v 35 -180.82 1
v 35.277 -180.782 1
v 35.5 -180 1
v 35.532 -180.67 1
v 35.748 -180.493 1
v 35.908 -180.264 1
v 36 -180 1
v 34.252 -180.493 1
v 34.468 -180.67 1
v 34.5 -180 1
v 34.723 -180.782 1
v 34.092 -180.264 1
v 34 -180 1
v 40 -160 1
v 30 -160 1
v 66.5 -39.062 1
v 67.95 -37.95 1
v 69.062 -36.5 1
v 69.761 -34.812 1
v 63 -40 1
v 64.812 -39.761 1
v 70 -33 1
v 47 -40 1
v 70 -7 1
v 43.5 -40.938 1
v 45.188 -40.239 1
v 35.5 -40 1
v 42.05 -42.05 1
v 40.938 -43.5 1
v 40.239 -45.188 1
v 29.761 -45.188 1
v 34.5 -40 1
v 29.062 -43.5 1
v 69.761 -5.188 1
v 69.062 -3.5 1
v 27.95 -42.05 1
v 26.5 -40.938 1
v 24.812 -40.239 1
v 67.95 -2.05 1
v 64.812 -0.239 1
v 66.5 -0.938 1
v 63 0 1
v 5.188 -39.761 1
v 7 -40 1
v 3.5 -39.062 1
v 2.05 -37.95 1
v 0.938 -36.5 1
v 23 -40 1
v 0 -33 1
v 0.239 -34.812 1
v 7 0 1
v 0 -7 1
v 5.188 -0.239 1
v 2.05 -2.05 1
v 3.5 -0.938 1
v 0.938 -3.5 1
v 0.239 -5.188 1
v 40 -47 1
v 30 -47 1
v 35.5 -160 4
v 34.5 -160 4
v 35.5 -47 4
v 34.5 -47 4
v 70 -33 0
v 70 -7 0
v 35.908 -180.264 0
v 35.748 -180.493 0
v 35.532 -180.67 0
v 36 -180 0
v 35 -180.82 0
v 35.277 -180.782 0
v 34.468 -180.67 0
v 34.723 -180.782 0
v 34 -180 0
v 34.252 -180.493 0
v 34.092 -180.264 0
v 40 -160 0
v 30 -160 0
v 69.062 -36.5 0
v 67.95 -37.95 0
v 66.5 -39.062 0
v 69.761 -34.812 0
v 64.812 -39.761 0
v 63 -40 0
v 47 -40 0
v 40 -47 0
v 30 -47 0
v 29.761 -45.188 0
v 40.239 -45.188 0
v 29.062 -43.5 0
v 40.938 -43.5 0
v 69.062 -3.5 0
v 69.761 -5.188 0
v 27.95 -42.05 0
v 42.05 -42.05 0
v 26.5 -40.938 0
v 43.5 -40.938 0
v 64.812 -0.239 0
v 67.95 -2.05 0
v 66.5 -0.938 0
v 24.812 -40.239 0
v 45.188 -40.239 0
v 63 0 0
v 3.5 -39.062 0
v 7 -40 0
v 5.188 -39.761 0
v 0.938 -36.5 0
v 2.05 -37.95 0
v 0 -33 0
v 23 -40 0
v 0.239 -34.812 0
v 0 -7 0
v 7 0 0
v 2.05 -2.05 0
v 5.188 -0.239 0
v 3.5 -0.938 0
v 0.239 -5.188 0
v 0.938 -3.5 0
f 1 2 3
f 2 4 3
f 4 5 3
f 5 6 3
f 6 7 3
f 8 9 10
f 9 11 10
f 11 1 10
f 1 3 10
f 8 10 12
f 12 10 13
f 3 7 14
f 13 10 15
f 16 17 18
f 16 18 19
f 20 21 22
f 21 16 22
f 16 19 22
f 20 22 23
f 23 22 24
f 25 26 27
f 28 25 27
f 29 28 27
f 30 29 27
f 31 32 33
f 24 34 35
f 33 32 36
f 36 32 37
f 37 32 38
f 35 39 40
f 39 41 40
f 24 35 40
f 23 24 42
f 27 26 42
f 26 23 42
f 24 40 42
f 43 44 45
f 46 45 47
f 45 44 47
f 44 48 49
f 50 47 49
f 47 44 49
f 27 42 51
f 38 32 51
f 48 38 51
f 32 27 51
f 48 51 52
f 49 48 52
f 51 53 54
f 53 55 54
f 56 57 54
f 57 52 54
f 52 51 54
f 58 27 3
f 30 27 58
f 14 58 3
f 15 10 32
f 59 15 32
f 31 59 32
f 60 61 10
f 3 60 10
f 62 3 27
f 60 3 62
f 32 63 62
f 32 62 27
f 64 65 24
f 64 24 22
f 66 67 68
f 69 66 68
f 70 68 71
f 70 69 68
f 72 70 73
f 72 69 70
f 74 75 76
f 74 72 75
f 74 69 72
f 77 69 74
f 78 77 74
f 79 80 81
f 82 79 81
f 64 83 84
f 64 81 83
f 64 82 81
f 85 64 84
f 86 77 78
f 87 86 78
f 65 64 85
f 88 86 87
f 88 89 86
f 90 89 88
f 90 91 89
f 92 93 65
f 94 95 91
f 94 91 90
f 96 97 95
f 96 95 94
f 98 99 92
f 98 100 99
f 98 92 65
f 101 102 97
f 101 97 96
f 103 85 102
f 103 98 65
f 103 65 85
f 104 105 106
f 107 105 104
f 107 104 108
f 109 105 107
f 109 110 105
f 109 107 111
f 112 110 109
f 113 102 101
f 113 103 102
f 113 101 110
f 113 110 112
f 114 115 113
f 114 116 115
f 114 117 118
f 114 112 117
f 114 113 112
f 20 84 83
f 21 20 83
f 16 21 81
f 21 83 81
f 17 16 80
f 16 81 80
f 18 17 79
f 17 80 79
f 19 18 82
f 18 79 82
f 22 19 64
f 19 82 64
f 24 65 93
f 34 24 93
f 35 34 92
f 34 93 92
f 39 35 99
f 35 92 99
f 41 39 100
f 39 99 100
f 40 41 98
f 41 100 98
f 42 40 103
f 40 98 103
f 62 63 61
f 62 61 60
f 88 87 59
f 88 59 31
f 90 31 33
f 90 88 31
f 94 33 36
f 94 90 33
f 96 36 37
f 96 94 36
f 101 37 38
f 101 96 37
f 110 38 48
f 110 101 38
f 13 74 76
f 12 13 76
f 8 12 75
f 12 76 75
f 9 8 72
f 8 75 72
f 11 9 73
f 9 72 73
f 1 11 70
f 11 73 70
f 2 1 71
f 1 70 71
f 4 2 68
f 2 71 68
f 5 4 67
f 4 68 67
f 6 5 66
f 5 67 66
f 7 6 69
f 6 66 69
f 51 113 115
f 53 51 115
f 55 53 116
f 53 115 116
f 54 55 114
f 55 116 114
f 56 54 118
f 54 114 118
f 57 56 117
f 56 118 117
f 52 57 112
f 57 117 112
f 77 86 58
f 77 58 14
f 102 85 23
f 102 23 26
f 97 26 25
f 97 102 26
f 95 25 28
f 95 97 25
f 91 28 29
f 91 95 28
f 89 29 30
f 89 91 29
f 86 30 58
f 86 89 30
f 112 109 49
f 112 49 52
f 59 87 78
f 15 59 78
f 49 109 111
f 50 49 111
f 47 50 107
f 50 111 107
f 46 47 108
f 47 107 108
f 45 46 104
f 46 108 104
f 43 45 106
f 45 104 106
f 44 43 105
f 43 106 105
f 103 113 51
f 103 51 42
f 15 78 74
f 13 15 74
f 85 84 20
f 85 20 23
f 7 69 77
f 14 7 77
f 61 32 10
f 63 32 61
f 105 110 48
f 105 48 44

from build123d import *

# Parameters (mm, degrees)
PAD_DEPTH       = 1
PAD001_DEPTH    = 3
POCKET_DEPTH    = 35.501
POCKET001_DEPTH = 35.501


with BuildPart() as part:
    # Sketch → Pad (new body)
    with BuildSketch(Plane.XY):
        with BuildLine():
            Line((7, 0), (63, 0))
            ThreePointArc((70, -7), (67.949747, -2.050253), (63, 0))
            Line((70, -7), (70, -33))
            ThreePointArc((63, -40), (67.949747, -37.949747), (70, -33))
            Line((63, -40), (47, -40))
            ThreePointArc((47, -40), (42.050253, -42.050253), (40, -47))
            Line((40, -47), (40, -160))
            Line((36, -180), (40, -160))
            ThreePointArc((34, -180), (35, -180.819804), (36, -180))
            Line((30, -160), (34, -180))
            Line((30, -47), (30, -160))
            ThreePointArc((30, -47), (27.949747, -42.050253), (23, -40))
            Line((23, -40), (7, -40))
            ThreePointArc((0, -33), (2.050253, -37.949747), (7, -40))
            Line((0, -33), (0, -7))
            ThreePointArc((7, 0), (2.050253, -2.050253), (0, -7))
        make_face()
    extrude(amount=PAD_DEPTH)

    # Sketch001 (on Face18 of Pad) → Pad001 (join)
    with BuildSketch(Plane.XY.offset(1)):
        Polygon((34.5, -180), (35.5, -180), (35.5, -160), (35.5, -47), (35.5, -40), (34.5, -40), (34.5, -47), (34.5, -160), align=None)
    extrude(amount=PAD001_DEPTH)

    # Sketch002 (on Face26 of Pad001) → Pocket (cut, through all)
    with BuildSketch(Plane(origin=(34.5, 0, 0), x_dir=(0, -1, 0), z_dir=(-1, 0, 0))):
        Polygon((160, 4), (180, 1), (180, 4), align=None)
    extrude(amount=-POCKET_DEPTH, mode=Mode.SUBTRACT)

    # Sketch003 (on Face22 of Pocket) → Pocket001 (cut, through all)
    with BuildSketch(Plane(origin=(34.5, 0, 0), x_dir=(0, -1, 0), z_dir=(-1, 0, 0))):
        Polygon((40, 1), (40, 4), (47, 4), align=None)
    extrude(amount=-POCKET001_DEPTH, mode=Mode.SUBTRACT)


solid = part.part
